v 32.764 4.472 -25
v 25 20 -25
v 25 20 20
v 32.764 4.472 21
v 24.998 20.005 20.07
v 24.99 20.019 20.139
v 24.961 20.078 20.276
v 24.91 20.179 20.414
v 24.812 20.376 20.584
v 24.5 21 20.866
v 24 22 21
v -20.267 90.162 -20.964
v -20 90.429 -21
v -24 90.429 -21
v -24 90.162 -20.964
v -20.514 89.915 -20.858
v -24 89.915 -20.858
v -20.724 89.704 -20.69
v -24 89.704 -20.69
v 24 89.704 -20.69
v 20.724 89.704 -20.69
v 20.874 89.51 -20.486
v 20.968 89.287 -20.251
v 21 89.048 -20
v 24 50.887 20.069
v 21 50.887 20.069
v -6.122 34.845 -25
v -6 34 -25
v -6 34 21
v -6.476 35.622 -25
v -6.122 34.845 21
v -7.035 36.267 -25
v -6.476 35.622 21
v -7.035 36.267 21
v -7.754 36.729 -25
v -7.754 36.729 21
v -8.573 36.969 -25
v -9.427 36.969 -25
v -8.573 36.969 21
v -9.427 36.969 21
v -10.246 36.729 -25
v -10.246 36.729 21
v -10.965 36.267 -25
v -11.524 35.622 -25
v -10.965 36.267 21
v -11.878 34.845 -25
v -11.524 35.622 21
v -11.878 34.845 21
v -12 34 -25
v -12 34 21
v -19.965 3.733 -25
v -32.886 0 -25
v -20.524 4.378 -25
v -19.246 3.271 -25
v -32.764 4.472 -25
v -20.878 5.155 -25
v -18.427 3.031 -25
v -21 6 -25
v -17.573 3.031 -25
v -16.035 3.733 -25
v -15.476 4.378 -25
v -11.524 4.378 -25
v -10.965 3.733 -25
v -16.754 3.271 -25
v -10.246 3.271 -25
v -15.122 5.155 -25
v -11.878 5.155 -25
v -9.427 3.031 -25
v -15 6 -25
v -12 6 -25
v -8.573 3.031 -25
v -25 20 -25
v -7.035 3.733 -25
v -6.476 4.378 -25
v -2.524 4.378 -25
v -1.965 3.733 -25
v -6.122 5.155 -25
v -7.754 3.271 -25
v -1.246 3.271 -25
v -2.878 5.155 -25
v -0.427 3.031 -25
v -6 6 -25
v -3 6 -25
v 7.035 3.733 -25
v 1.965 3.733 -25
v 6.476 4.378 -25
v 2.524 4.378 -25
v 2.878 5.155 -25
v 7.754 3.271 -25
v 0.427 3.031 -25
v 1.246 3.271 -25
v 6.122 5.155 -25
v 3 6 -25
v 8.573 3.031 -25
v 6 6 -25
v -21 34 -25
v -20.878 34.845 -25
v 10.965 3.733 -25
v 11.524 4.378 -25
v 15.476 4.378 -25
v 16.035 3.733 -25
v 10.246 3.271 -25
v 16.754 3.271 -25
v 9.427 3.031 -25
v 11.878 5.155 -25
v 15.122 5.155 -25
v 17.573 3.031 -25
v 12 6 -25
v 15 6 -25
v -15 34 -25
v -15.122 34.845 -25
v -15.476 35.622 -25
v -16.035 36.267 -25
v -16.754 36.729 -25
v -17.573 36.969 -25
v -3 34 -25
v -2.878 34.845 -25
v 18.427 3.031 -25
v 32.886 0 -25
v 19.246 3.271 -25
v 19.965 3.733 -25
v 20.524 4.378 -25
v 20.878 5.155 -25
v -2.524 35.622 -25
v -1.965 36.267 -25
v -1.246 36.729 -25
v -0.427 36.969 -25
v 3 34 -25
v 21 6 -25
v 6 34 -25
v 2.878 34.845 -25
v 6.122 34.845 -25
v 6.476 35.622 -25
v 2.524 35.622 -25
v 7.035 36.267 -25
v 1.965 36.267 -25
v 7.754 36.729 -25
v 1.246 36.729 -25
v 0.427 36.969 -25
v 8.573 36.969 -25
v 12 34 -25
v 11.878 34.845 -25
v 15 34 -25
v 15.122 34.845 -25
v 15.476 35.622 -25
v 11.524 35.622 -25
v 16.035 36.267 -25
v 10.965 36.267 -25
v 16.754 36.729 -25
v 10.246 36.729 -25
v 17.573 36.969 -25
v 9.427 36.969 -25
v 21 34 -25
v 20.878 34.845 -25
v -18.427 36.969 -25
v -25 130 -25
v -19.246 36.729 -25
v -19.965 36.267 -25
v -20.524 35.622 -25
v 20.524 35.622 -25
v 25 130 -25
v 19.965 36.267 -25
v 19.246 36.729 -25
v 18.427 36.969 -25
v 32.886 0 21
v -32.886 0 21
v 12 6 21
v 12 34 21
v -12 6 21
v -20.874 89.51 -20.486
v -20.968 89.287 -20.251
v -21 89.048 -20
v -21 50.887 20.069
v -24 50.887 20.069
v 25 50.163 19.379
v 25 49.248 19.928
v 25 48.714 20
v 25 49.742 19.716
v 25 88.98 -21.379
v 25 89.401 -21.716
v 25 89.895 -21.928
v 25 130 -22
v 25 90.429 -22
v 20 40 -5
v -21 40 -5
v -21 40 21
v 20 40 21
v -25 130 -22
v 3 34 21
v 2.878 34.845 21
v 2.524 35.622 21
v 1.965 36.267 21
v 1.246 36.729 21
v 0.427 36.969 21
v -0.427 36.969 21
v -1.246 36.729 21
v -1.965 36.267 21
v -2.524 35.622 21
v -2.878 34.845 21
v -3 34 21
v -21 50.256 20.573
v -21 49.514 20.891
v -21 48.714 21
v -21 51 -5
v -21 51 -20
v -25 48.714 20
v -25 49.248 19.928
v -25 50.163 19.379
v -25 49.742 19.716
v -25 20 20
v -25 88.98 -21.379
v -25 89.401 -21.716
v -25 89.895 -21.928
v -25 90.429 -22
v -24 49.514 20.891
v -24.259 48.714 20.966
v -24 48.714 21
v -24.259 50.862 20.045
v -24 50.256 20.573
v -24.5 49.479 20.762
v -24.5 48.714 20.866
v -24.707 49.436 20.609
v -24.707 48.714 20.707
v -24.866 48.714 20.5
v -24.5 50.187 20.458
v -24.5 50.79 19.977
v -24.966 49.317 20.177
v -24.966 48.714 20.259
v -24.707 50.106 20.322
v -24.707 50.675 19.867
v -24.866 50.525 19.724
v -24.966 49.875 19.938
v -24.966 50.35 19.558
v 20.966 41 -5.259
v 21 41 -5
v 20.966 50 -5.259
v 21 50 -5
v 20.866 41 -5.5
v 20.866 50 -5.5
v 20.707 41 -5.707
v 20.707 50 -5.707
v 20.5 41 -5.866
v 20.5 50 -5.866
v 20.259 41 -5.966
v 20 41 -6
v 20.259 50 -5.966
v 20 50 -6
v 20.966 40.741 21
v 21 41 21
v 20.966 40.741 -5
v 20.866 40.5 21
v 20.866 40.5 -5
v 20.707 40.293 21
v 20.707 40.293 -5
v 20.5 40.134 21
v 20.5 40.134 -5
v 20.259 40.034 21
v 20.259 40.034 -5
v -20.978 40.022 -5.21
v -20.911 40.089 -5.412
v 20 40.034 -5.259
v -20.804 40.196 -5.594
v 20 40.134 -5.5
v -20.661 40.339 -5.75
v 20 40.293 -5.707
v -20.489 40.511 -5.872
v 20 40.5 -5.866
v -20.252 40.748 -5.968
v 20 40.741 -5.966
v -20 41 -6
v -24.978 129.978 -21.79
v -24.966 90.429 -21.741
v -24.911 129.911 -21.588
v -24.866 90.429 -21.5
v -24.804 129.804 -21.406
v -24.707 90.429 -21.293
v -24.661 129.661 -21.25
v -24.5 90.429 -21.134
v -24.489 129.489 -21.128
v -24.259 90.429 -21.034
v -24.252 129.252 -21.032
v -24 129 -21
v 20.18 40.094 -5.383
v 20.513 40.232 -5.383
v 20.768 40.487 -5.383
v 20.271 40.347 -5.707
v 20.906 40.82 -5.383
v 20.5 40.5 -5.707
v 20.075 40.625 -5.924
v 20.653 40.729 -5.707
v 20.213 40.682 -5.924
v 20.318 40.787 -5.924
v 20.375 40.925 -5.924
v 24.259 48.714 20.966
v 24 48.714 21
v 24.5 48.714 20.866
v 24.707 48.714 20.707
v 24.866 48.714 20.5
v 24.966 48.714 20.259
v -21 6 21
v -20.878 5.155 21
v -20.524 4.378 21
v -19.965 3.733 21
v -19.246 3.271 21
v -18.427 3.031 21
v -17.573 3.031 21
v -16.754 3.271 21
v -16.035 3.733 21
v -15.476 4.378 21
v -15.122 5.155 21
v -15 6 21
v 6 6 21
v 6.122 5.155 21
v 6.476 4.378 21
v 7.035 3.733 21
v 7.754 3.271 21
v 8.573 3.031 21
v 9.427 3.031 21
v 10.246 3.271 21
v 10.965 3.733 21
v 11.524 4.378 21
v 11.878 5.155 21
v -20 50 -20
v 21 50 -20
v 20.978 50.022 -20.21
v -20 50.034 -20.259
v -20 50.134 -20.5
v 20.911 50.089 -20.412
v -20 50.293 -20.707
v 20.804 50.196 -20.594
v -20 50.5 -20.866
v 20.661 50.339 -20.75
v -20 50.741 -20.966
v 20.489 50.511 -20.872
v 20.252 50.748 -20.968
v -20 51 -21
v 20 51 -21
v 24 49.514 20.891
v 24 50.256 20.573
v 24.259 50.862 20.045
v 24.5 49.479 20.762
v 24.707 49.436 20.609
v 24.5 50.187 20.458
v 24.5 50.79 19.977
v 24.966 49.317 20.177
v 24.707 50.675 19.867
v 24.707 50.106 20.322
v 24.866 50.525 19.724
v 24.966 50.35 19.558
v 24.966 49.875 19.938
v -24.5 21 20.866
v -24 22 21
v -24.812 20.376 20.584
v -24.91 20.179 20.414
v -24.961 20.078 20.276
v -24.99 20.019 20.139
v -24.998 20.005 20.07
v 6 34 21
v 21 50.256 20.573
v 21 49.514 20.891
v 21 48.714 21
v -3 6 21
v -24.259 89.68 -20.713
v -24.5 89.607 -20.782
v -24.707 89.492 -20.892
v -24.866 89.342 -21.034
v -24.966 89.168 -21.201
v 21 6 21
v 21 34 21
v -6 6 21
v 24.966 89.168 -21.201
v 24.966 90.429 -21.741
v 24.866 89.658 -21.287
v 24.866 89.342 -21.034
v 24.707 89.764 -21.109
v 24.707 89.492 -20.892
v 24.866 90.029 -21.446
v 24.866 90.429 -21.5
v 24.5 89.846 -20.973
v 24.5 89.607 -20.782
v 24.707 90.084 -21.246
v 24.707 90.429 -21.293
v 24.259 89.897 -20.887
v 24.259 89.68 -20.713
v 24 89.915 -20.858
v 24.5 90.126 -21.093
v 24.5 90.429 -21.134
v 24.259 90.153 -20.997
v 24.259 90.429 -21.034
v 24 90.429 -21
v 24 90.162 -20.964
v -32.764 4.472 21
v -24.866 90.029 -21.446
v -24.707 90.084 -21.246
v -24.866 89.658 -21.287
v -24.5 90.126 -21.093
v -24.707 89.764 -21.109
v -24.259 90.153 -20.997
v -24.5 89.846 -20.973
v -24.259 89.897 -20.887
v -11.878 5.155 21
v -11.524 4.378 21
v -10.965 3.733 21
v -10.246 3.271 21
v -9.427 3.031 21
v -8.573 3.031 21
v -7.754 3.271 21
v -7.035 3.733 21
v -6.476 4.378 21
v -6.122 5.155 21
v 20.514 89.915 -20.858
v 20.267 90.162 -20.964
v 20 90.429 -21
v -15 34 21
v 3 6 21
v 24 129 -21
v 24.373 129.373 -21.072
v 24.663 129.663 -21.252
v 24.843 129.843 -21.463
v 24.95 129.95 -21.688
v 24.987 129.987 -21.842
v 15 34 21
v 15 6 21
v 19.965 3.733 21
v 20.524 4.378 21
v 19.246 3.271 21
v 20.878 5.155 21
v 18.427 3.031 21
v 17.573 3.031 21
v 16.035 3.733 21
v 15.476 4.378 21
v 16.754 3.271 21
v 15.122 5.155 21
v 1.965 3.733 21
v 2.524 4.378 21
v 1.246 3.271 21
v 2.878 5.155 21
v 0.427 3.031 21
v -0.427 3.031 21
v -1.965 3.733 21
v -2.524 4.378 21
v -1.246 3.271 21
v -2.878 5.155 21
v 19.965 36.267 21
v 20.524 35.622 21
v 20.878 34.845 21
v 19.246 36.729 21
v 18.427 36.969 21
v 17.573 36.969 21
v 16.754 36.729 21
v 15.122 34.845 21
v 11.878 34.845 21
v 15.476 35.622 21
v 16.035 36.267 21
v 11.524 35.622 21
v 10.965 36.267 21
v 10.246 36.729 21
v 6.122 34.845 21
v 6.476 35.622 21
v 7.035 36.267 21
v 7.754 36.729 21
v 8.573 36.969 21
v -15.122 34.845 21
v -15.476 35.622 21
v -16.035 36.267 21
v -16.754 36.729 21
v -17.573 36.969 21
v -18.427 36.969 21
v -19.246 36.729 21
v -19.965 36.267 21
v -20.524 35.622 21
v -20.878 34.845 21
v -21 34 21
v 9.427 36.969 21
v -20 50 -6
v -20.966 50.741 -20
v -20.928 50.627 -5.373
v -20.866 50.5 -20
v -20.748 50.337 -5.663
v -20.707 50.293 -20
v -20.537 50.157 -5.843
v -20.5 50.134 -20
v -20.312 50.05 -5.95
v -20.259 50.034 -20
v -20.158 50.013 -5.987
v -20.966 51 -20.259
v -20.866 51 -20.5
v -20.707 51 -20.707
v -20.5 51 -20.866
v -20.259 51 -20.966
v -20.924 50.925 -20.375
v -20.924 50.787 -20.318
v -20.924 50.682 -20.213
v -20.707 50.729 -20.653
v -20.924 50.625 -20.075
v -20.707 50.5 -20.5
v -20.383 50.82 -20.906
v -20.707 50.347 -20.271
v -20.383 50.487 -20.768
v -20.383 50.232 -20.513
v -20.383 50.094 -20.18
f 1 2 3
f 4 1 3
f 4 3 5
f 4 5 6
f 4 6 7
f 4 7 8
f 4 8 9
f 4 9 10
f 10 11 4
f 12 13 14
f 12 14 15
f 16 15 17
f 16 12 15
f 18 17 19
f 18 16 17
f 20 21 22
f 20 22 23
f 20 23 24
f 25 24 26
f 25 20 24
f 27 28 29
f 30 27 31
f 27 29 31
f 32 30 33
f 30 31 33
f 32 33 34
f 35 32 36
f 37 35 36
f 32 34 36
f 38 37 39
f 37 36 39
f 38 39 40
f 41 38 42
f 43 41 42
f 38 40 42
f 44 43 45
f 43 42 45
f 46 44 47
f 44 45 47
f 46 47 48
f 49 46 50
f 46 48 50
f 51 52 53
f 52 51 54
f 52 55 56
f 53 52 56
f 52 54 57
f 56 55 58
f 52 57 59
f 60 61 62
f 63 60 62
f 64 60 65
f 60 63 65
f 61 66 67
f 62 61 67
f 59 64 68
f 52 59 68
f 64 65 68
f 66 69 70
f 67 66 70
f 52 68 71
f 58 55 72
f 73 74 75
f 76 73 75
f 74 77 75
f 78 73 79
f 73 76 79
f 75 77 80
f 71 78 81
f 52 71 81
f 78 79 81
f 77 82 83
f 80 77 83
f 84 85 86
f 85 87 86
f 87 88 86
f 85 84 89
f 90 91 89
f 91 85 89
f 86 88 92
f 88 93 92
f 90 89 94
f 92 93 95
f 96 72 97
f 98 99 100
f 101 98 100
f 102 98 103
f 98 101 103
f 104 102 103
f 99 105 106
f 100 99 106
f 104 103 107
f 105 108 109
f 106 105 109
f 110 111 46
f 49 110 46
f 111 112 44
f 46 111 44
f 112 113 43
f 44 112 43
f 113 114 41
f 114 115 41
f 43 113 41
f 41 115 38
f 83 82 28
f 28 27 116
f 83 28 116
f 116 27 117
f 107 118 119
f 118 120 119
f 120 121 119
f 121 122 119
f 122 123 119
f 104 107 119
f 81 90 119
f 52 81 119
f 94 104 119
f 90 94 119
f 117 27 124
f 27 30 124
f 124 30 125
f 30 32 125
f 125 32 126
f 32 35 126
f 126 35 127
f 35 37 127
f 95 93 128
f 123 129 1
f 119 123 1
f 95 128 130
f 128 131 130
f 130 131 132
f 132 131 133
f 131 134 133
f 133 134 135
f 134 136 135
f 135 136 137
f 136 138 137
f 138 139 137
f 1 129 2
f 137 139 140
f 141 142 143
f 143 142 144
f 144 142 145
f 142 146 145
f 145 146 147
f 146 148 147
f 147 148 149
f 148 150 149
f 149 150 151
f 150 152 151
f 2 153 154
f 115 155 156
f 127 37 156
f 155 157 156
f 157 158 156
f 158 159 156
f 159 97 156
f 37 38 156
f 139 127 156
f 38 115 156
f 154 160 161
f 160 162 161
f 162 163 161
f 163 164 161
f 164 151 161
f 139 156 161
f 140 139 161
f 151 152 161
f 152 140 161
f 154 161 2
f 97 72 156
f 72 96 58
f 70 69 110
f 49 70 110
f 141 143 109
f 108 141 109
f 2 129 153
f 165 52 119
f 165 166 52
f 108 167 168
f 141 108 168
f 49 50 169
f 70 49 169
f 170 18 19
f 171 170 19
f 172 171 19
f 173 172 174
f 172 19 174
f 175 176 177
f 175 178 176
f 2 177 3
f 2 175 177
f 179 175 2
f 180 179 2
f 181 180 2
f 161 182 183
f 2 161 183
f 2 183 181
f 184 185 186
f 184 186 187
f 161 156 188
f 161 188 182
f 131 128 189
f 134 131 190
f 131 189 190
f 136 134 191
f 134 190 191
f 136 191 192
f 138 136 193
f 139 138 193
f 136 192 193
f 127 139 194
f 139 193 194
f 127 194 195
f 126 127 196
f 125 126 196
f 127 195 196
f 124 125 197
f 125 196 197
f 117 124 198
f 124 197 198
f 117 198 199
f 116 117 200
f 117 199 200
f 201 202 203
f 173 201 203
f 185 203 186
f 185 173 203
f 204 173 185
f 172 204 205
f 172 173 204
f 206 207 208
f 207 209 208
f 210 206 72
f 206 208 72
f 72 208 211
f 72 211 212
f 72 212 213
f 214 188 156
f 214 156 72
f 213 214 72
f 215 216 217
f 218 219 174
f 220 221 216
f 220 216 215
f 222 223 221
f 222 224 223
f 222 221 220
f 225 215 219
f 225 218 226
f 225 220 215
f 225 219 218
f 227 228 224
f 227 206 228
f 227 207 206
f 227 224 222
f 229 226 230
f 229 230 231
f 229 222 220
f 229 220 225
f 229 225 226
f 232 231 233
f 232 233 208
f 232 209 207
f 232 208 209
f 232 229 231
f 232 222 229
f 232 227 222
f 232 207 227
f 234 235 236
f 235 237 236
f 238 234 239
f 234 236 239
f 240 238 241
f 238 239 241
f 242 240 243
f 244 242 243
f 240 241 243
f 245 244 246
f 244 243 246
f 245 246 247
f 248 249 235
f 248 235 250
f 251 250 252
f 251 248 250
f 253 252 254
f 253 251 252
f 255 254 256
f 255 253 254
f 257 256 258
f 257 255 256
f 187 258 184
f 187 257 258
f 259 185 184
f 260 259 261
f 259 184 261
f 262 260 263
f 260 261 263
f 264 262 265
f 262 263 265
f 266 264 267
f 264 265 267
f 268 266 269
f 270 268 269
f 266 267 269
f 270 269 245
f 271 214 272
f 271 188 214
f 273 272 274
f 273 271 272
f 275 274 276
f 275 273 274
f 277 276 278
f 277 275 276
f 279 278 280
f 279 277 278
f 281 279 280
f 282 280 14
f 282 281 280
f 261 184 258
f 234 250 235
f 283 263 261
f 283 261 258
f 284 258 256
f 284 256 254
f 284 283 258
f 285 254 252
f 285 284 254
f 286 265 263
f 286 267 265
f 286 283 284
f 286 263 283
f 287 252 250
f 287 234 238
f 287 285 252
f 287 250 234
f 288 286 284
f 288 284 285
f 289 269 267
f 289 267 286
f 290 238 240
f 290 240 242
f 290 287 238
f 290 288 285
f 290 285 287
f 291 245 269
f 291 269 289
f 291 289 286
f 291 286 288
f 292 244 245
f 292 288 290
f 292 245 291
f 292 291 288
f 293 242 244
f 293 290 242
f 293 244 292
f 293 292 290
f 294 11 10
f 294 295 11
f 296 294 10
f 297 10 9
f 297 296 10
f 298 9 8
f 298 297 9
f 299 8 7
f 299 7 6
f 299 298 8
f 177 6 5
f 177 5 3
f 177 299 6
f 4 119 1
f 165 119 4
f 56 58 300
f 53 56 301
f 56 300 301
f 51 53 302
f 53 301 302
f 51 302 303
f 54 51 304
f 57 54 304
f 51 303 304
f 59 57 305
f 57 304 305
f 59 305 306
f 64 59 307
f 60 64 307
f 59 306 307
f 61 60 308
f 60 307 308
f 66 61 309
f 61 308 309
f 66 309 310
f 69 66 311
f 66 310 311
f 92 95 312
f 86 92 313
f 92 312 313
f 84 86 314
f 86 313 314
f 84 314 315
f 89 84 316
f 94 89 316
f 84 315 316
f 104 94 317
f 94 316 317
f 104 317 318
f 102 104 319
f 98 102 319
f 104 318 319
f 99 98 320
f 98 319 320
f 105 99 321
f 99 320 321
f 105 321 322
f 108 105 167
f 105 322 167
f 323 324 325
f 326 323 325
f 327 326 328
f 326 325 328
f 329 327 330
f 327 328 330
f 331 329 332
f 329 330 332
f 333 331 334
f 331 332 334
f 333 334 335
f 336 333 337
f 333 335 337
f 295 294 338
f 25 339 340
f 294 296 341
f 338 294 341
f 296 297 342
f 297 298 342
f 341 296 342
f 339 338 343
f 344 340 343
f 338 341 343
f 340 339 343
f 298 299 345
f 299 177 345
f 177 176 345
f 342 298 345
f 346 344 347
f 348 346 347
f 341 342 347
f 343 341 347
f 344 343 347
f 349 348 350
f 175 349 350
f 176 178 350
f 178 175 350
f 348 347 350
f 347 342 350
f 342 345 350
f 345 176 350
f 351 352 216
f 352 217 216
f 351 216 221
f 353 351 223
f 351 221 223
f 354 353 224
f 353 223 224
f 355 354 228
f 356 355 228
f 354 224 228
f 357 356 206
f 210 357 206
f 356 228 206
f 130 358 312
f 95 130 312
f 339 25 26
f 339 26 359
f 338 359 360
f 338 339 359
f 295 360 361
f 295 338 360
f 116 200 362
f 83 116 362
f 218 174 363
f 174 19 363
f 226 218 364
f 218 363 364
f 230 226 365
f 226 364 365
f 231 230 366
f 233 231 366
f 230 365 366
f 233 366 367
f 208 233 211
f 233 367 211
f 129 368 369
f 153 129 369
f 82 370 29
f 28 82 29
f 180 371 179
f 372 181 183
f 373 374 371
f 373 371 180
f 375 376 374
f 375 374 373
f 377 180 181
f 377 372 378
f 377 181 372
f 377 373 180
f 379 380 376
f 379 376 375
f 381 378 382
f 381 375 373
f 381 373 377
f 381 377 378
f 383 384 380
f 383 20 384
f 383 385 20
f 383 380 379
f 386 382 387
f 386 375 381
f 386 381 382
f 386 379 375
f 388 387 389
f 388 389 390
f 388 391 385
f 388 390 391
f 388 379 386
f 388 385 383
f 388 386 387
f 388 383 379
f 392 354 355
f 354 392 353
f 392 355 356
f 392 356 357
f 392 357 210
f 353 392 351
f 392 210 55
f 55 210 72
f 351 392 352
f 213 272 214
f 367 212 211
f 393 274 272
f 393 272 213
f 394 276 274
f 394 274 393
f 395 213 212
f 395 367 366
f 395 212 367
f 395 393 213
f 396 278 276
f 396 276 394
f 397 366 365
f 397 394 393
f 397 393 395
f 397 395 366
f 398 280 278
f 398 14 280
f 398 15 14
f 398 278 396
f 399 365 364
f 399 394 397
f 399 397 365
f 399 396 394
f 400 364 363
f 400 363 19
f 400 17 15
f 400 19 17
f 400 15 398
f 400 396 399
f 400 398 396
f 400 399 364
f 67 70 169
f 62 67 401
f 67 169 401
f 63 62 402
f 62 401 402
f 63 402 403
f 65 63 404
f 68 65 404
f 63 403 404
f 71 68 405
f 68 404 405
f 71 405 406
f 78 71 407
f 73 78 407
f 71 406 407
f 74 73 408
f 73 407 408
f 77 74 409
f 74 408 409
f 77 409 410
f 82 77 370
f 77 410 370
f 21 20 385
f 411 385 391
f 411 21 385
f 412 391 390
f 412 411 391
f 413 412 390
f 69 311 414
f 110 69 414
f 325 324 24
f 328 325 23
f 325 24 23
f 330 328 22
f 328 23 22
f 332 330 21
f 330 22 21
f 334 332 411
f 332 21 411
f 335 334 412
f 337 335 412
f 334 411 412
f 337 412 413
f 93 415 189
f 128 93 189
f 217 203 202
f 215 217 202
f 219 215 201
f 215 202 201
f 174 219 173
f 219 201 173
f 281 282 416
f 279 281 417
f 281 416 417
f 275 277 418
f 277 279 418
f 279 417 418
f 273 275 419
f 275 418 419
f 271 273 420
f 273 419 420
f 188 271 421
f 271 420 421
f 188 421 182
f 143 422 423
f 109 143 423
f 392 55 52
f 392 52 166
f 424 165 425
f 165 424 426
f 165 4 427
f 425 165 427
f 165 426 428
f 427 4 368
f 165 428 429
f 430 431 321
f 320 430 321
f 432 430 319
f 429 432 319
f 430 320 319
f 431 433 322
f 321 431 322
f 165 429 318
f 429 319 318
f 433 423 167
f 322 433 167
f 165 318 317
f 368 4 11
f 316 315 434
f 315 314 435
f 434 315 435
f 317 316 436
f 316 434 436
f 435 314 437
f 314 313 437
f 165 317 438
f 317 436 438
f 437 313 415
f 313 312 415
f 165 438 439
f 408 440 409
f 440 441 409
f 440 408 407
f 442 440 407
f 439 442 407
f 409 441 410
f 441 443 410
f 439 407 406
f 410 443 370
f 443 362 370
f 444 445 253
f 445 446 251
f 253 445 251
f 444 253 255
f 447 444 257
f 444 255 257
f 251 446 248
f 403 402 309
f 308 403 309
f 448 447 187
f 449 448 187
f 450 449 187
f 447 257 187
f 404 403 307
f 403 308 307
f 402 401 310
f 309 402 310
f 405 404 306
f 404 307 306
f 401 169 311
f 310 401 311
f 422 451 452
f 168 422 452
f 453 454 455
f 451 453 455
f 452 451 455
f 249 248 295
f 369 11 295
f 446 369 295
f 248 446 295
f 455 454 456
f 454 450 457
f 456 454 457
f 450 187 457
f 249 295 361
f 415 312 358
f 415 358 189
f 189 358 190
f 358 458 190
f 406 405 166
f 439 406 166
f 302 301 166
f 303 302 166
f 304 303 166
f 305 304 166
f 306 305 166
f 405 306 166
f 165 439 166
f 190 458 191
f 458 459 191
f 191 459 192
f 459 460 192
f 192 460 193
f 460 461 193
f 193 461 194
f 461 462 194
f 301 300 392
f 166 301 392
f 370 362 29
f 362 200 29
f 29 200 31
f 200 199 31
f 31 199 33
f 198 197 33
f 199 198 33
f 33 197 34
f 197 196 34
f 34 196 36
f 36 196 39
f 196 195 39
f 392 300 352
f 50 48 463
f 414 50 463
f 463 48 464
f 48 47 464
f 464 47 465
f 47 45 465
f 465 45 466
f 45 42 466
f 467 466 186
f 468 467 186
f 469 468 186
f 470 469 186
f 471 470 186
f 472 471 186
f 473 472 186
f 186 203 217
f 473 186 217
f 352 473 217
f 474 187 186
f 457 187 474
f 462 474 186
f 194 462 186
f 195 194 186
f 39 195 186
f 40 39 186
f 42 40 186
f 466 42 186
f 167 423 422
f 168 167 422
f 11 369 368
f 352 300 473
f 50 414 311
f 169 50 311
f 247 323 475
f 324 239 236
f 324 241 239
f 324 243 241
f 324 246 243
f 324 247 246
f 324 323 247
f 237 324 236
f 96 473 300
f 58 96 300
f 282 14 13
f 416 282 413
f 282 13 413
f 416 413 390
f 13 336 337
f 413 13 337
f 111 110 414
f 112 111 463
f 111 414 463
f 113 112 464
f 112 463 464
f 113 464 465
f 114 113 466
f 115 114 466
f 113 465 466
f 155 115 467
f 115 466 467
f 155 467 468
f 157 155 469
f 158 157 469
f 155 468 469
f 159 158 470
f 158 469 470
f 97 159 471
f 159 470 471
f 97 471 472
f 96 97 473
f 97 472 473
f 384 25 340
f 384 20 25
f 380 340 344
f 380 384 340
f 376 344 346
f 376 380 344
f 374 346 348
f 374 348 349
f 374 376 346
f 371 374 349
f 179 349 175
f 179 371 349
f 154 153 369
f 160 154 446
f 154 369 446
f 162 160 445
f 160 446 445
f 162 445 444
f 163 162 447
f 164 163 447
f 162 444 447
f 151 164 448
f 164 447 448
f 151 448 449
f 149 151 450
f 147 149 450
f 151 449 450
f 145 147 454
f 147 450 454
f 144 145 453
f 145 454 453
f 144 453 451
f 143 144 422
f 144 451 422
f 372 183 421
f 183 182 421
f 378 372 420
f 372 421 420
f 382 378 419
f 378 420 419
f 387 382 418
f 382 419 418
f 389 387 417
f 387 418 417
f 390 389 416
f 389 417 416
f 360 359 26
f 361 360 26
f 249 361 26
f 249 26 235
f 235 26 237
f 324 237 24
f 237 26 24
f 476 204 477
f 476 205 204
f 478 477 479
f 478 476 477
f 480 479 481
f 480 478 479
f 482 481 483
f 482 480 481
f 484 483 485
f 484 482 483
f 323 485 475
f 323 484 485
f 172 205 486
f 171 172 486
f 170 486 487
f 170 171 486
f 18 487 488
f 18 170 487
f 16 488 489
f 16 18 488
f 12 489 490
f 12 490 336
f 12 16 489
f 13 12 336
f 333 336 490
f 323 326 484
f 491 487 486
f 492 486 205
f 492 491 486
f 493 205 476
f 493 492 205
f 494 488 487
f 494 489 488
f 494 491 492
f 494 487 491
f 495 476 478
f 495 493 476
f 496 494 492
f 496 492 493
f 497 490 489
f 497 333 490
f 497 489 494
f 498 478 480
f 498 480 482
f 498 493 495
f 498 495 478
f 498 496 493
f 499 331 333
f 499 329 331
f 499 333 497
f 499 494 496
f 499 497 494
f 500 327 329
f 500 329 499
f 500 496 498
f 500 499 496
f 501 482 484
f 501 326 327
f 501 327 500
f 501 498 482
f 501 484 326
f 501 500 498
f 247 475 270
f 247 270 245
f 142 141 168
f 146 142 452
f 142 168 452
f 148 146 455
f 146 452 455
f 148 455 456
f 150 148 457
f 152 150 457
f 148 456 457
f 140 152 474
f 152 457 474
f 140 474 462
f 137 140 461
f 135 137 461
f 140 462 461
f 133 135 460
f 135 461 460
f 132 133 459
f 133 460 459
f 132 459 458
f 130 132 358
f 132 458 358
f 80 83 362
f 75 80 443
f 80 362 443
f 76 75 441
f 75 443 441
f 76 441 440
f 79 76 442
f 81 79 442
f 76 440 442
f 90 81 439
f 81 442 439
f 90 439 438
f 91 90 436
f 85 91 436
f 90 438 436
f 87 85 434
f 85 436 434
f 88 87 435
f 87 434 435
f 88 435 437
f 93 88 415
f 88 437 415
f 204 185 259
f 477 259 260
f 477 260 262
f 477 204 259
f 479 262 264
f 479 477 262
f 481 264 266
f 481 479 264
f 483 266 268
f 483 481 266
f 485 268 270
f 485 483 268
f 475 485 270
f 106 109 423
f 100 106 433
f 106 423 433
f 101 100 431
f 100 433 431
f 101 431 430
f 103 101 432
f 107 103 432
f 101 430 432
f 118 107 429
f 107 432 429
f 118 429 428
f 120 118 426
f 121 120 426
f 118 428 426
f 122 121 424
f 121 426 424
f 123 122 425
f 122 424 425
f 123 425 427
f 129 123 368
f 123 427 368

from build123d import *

# Parameters (mm, degrees)
SKETCH_1_W             = 50
SKETCH_1_H             = 46
EXTRUDE_1_DEPTH        = 40
EXTRUDE_2_DEPTH        = 10
SKETCH_8_W             = 42
SKETCH_8_H             = 10
EXTRUDE_5_DEPTH        = 15
SKETCH_3_W             = 50
SKETCH_3_H             = 4
EXTRUDE_3_DEPTH        = 80
SKETCH_4_W             = 70
SKETCH_4_H             = 46
SKETCH_5_W             = 50
SKETCH_5_H             = 46
EXTRUDE_4_DEPTH        = 4
FILLET_2_R             = 3
CHAMFER_1_SIZE2        = 2.113879869
CHAMFER_1_SIZE         = 5
CHAMFER_1_EDGE_2_SIZE2 = 5
CHAMFER_1_EDGE_2_SIZE  = 2.113879869
FILLET_4_R             = 1
CUT_EXTRUDE_1_DEPTH    = 47.0000001
FILLET_5_R             = 1


with BuildPart() as part:
    # 草图1 → 凸台-拉伸1 (new body)
    with BuildSketch(Plane(origin=(0, 0, 0), x_dir=(1, 0, 0), z_dir=(0, 1, 0))):
        with Locations((0, 2)):
            Rectangle(SKETCH_1_W, SKETCH_1_H)
    extrude(amount=EXTRUDE_1_DEPTH)

    # 草图2 → 凸台-拉伸2 (add)
    with BuildSketch(Plane(origin=(0, 40, 0), x_dir=(1, 0, 0), z_dir=(0, 1, 0))):
        Polygon((-25, 25), (-25, -21), (-21, -21), (-21, 21), (21, 21), (21, -21), (25, -21), (25, 25), align=None)
    extrude(amount=EXTRUDE_2_DEPTH)

    # 草图8 → 凸台-拉伸5 (add)
    with BuildSketch(Plane.XY.offset(-21)):
        with Locations((0, 45)):
            Rectangle(SKETCH_8_W, SKETCH_8_H)
    extrude(amount=EXTRUDE_5_DEPTH)

    # 草图3 → 凸台-拉伸3 (add)
    with BuildSketch(Plane(origin=(0, 50, 0), x_dir=(1, 0, 0), z_dir=(0, 1, 0))):
        with Locations((0, 23)):
            Rectangle(SKETCH_3_W, SKETCH_3_H)
    extrude(amount=EXTRUDE_3_DEPTH)

    # 草图4 → 放样2 section 0
    with BuildSketch(Plane.XZ):
        with Locations((0, -2)):
            Rectangle(SKETCH_4_W, SKETCH_4_H)
    # 草图5 → 放样2 section 1
    with BuildSketch(Plane(origin=(0, 20, 0), x_dir=(1, 0, 0), z_dir=(0, 1, 0))):
        with Locations((0, 2)):
            Rectangle(SKETCH_5_W, SKETCH_5_H)
    loft()

    # 草图6 → 凸台-拉伸4 (add)
    with BuildSketch(Plane.ZY.offset(25)):
        Polygon((-21, 90), (21, 50), (-21, 50), align=None)
    extrude_4 = extrude(amount=-EXTRUDE_4_DEPTH)

    # 镜向2: 凸台-拉伸4 across plane
    add(extrude_4.mirror(Plane(origin=(0, 0, 0), x_dir=(0, 0, 1), z_dir=(1, 0, 0))))

    # 圆角2
    fillet_2_edges = [part.edges().sort_by_distance(p)[0] for p in [
        (23, 50, 21),
        (-23, 50, 21),
    ]]
    fillet(fillet_2_edges, radius=FILLET_2_R)

    # 倒角1
    chamfer_1_edges = [part.edges().sort_by_distance(p)[0] for p in [
        (35, 0, -2),
    ]]
    chamfer(chamfer_1_edges, length=CHAMFER_1_SIZE, length2=CHAMFER_1_SIZE2)

    # 倒角1 edge 2
    chamfer_1_edge_2_edges = [part.edges().sort_by_distance(p)[0] for p in [
        (-35, 0, -2),
    ]]
    chamfer(chamfer_1_edge_2_edges, length=CHAMFER_1_EDGE_2_SIZE, length2=CHAMFER_1_EDGE_2_SIZE2)

    # 圆角4
    fillet_4_edges = [part.edges().sort_by_distance(p)[0] for p in [
        (21, 40, 7.5),
    ]]
    fillet(fillet_4_edges, radius=FILLET_4_R)

    # 草图7 → 切除-拉伸1 (cut, through all)
    with BuildSketch(Plane.XY.offset(21)):
        with BuildLine():
            Line((-21, 34), (-21, 6))
            ThreePointArc((-21, 6), (-18, 3), (-15, 6))
            Line((-15, 6), (-15, 34))
            ThreePointArc((-15, 34), (-18, 37), (-21, 34))
        make_face()
        with BuildLine():
            Line((-12, 34), (-12, 6))
            ThreePointArc((-12, 6), (-9, 3), (-6, 6))
            Line((-6, 6), (-6, 34))
            ThreePointArc((-6, 34), (-9, 37), (-12, 34))
        make_face()
        with BuildLine():
            Line((-3, 34), (-3, 6))
            ThreePointArc((-3, 6), (0, 3), (3, 6))
            Line((3, 6), (3, 34))
            ThreePointArc((3, 34), (0, 37), (-3, 34))
        make_face()
        with BuildLine():
            Line((6, 34), (6, 6))
            ThreePointArc((6, 6), (9, 3), (12, 6))
            Line((12, 6), (12, 34))
            ThreePointArc((12, 34), (9, 37), (6, 34))
        make_face()
        with BuildLine():
            Line((15, 34), (15, 6))
            ThreePointArc((15, 6), (18, 3), (21, 6))
            Line((21, 6), (21, 34))
            ThreePointArc((21, 34), (18, 37), (15, 34))
        make_face()
    extrude(amount=-CUT_EXTRUDE_1_DEPTH, mode=Mode.SUBTRACT)

    # 圆角5
    fillet_5_edges = [part.edges().sort_by_distance(p)[0] for p in [
        (-25, 34.357142857, 21),
        (25, 34.357142857, 21),
        (-25, 49.89604361, 20.75743509),
        (25, 49.89604361, 20.75743509),
        (-25, 70.443349754, -0.465517241),
        (25, 70.443349754, -0.465517241),
        (-0.5, 40, -6),
        (20.707106781, 40.292893219, -6),
        (21, 70, -21),
        (0, 50, -21),
        (-21, 70, -21),
        (-23, 90, -21),
        (-25, 110, -21),
        (0, 130, -21),
        (25, 110, -21),
        (23, 90, -21),
        (-21, 50, -13.5),
        (-21, 45, -6),
        (21, 45.5, -6),
    ]]
    fillet(fillet_5_edges, radius=FILLET_5_R)


solid = part.part
